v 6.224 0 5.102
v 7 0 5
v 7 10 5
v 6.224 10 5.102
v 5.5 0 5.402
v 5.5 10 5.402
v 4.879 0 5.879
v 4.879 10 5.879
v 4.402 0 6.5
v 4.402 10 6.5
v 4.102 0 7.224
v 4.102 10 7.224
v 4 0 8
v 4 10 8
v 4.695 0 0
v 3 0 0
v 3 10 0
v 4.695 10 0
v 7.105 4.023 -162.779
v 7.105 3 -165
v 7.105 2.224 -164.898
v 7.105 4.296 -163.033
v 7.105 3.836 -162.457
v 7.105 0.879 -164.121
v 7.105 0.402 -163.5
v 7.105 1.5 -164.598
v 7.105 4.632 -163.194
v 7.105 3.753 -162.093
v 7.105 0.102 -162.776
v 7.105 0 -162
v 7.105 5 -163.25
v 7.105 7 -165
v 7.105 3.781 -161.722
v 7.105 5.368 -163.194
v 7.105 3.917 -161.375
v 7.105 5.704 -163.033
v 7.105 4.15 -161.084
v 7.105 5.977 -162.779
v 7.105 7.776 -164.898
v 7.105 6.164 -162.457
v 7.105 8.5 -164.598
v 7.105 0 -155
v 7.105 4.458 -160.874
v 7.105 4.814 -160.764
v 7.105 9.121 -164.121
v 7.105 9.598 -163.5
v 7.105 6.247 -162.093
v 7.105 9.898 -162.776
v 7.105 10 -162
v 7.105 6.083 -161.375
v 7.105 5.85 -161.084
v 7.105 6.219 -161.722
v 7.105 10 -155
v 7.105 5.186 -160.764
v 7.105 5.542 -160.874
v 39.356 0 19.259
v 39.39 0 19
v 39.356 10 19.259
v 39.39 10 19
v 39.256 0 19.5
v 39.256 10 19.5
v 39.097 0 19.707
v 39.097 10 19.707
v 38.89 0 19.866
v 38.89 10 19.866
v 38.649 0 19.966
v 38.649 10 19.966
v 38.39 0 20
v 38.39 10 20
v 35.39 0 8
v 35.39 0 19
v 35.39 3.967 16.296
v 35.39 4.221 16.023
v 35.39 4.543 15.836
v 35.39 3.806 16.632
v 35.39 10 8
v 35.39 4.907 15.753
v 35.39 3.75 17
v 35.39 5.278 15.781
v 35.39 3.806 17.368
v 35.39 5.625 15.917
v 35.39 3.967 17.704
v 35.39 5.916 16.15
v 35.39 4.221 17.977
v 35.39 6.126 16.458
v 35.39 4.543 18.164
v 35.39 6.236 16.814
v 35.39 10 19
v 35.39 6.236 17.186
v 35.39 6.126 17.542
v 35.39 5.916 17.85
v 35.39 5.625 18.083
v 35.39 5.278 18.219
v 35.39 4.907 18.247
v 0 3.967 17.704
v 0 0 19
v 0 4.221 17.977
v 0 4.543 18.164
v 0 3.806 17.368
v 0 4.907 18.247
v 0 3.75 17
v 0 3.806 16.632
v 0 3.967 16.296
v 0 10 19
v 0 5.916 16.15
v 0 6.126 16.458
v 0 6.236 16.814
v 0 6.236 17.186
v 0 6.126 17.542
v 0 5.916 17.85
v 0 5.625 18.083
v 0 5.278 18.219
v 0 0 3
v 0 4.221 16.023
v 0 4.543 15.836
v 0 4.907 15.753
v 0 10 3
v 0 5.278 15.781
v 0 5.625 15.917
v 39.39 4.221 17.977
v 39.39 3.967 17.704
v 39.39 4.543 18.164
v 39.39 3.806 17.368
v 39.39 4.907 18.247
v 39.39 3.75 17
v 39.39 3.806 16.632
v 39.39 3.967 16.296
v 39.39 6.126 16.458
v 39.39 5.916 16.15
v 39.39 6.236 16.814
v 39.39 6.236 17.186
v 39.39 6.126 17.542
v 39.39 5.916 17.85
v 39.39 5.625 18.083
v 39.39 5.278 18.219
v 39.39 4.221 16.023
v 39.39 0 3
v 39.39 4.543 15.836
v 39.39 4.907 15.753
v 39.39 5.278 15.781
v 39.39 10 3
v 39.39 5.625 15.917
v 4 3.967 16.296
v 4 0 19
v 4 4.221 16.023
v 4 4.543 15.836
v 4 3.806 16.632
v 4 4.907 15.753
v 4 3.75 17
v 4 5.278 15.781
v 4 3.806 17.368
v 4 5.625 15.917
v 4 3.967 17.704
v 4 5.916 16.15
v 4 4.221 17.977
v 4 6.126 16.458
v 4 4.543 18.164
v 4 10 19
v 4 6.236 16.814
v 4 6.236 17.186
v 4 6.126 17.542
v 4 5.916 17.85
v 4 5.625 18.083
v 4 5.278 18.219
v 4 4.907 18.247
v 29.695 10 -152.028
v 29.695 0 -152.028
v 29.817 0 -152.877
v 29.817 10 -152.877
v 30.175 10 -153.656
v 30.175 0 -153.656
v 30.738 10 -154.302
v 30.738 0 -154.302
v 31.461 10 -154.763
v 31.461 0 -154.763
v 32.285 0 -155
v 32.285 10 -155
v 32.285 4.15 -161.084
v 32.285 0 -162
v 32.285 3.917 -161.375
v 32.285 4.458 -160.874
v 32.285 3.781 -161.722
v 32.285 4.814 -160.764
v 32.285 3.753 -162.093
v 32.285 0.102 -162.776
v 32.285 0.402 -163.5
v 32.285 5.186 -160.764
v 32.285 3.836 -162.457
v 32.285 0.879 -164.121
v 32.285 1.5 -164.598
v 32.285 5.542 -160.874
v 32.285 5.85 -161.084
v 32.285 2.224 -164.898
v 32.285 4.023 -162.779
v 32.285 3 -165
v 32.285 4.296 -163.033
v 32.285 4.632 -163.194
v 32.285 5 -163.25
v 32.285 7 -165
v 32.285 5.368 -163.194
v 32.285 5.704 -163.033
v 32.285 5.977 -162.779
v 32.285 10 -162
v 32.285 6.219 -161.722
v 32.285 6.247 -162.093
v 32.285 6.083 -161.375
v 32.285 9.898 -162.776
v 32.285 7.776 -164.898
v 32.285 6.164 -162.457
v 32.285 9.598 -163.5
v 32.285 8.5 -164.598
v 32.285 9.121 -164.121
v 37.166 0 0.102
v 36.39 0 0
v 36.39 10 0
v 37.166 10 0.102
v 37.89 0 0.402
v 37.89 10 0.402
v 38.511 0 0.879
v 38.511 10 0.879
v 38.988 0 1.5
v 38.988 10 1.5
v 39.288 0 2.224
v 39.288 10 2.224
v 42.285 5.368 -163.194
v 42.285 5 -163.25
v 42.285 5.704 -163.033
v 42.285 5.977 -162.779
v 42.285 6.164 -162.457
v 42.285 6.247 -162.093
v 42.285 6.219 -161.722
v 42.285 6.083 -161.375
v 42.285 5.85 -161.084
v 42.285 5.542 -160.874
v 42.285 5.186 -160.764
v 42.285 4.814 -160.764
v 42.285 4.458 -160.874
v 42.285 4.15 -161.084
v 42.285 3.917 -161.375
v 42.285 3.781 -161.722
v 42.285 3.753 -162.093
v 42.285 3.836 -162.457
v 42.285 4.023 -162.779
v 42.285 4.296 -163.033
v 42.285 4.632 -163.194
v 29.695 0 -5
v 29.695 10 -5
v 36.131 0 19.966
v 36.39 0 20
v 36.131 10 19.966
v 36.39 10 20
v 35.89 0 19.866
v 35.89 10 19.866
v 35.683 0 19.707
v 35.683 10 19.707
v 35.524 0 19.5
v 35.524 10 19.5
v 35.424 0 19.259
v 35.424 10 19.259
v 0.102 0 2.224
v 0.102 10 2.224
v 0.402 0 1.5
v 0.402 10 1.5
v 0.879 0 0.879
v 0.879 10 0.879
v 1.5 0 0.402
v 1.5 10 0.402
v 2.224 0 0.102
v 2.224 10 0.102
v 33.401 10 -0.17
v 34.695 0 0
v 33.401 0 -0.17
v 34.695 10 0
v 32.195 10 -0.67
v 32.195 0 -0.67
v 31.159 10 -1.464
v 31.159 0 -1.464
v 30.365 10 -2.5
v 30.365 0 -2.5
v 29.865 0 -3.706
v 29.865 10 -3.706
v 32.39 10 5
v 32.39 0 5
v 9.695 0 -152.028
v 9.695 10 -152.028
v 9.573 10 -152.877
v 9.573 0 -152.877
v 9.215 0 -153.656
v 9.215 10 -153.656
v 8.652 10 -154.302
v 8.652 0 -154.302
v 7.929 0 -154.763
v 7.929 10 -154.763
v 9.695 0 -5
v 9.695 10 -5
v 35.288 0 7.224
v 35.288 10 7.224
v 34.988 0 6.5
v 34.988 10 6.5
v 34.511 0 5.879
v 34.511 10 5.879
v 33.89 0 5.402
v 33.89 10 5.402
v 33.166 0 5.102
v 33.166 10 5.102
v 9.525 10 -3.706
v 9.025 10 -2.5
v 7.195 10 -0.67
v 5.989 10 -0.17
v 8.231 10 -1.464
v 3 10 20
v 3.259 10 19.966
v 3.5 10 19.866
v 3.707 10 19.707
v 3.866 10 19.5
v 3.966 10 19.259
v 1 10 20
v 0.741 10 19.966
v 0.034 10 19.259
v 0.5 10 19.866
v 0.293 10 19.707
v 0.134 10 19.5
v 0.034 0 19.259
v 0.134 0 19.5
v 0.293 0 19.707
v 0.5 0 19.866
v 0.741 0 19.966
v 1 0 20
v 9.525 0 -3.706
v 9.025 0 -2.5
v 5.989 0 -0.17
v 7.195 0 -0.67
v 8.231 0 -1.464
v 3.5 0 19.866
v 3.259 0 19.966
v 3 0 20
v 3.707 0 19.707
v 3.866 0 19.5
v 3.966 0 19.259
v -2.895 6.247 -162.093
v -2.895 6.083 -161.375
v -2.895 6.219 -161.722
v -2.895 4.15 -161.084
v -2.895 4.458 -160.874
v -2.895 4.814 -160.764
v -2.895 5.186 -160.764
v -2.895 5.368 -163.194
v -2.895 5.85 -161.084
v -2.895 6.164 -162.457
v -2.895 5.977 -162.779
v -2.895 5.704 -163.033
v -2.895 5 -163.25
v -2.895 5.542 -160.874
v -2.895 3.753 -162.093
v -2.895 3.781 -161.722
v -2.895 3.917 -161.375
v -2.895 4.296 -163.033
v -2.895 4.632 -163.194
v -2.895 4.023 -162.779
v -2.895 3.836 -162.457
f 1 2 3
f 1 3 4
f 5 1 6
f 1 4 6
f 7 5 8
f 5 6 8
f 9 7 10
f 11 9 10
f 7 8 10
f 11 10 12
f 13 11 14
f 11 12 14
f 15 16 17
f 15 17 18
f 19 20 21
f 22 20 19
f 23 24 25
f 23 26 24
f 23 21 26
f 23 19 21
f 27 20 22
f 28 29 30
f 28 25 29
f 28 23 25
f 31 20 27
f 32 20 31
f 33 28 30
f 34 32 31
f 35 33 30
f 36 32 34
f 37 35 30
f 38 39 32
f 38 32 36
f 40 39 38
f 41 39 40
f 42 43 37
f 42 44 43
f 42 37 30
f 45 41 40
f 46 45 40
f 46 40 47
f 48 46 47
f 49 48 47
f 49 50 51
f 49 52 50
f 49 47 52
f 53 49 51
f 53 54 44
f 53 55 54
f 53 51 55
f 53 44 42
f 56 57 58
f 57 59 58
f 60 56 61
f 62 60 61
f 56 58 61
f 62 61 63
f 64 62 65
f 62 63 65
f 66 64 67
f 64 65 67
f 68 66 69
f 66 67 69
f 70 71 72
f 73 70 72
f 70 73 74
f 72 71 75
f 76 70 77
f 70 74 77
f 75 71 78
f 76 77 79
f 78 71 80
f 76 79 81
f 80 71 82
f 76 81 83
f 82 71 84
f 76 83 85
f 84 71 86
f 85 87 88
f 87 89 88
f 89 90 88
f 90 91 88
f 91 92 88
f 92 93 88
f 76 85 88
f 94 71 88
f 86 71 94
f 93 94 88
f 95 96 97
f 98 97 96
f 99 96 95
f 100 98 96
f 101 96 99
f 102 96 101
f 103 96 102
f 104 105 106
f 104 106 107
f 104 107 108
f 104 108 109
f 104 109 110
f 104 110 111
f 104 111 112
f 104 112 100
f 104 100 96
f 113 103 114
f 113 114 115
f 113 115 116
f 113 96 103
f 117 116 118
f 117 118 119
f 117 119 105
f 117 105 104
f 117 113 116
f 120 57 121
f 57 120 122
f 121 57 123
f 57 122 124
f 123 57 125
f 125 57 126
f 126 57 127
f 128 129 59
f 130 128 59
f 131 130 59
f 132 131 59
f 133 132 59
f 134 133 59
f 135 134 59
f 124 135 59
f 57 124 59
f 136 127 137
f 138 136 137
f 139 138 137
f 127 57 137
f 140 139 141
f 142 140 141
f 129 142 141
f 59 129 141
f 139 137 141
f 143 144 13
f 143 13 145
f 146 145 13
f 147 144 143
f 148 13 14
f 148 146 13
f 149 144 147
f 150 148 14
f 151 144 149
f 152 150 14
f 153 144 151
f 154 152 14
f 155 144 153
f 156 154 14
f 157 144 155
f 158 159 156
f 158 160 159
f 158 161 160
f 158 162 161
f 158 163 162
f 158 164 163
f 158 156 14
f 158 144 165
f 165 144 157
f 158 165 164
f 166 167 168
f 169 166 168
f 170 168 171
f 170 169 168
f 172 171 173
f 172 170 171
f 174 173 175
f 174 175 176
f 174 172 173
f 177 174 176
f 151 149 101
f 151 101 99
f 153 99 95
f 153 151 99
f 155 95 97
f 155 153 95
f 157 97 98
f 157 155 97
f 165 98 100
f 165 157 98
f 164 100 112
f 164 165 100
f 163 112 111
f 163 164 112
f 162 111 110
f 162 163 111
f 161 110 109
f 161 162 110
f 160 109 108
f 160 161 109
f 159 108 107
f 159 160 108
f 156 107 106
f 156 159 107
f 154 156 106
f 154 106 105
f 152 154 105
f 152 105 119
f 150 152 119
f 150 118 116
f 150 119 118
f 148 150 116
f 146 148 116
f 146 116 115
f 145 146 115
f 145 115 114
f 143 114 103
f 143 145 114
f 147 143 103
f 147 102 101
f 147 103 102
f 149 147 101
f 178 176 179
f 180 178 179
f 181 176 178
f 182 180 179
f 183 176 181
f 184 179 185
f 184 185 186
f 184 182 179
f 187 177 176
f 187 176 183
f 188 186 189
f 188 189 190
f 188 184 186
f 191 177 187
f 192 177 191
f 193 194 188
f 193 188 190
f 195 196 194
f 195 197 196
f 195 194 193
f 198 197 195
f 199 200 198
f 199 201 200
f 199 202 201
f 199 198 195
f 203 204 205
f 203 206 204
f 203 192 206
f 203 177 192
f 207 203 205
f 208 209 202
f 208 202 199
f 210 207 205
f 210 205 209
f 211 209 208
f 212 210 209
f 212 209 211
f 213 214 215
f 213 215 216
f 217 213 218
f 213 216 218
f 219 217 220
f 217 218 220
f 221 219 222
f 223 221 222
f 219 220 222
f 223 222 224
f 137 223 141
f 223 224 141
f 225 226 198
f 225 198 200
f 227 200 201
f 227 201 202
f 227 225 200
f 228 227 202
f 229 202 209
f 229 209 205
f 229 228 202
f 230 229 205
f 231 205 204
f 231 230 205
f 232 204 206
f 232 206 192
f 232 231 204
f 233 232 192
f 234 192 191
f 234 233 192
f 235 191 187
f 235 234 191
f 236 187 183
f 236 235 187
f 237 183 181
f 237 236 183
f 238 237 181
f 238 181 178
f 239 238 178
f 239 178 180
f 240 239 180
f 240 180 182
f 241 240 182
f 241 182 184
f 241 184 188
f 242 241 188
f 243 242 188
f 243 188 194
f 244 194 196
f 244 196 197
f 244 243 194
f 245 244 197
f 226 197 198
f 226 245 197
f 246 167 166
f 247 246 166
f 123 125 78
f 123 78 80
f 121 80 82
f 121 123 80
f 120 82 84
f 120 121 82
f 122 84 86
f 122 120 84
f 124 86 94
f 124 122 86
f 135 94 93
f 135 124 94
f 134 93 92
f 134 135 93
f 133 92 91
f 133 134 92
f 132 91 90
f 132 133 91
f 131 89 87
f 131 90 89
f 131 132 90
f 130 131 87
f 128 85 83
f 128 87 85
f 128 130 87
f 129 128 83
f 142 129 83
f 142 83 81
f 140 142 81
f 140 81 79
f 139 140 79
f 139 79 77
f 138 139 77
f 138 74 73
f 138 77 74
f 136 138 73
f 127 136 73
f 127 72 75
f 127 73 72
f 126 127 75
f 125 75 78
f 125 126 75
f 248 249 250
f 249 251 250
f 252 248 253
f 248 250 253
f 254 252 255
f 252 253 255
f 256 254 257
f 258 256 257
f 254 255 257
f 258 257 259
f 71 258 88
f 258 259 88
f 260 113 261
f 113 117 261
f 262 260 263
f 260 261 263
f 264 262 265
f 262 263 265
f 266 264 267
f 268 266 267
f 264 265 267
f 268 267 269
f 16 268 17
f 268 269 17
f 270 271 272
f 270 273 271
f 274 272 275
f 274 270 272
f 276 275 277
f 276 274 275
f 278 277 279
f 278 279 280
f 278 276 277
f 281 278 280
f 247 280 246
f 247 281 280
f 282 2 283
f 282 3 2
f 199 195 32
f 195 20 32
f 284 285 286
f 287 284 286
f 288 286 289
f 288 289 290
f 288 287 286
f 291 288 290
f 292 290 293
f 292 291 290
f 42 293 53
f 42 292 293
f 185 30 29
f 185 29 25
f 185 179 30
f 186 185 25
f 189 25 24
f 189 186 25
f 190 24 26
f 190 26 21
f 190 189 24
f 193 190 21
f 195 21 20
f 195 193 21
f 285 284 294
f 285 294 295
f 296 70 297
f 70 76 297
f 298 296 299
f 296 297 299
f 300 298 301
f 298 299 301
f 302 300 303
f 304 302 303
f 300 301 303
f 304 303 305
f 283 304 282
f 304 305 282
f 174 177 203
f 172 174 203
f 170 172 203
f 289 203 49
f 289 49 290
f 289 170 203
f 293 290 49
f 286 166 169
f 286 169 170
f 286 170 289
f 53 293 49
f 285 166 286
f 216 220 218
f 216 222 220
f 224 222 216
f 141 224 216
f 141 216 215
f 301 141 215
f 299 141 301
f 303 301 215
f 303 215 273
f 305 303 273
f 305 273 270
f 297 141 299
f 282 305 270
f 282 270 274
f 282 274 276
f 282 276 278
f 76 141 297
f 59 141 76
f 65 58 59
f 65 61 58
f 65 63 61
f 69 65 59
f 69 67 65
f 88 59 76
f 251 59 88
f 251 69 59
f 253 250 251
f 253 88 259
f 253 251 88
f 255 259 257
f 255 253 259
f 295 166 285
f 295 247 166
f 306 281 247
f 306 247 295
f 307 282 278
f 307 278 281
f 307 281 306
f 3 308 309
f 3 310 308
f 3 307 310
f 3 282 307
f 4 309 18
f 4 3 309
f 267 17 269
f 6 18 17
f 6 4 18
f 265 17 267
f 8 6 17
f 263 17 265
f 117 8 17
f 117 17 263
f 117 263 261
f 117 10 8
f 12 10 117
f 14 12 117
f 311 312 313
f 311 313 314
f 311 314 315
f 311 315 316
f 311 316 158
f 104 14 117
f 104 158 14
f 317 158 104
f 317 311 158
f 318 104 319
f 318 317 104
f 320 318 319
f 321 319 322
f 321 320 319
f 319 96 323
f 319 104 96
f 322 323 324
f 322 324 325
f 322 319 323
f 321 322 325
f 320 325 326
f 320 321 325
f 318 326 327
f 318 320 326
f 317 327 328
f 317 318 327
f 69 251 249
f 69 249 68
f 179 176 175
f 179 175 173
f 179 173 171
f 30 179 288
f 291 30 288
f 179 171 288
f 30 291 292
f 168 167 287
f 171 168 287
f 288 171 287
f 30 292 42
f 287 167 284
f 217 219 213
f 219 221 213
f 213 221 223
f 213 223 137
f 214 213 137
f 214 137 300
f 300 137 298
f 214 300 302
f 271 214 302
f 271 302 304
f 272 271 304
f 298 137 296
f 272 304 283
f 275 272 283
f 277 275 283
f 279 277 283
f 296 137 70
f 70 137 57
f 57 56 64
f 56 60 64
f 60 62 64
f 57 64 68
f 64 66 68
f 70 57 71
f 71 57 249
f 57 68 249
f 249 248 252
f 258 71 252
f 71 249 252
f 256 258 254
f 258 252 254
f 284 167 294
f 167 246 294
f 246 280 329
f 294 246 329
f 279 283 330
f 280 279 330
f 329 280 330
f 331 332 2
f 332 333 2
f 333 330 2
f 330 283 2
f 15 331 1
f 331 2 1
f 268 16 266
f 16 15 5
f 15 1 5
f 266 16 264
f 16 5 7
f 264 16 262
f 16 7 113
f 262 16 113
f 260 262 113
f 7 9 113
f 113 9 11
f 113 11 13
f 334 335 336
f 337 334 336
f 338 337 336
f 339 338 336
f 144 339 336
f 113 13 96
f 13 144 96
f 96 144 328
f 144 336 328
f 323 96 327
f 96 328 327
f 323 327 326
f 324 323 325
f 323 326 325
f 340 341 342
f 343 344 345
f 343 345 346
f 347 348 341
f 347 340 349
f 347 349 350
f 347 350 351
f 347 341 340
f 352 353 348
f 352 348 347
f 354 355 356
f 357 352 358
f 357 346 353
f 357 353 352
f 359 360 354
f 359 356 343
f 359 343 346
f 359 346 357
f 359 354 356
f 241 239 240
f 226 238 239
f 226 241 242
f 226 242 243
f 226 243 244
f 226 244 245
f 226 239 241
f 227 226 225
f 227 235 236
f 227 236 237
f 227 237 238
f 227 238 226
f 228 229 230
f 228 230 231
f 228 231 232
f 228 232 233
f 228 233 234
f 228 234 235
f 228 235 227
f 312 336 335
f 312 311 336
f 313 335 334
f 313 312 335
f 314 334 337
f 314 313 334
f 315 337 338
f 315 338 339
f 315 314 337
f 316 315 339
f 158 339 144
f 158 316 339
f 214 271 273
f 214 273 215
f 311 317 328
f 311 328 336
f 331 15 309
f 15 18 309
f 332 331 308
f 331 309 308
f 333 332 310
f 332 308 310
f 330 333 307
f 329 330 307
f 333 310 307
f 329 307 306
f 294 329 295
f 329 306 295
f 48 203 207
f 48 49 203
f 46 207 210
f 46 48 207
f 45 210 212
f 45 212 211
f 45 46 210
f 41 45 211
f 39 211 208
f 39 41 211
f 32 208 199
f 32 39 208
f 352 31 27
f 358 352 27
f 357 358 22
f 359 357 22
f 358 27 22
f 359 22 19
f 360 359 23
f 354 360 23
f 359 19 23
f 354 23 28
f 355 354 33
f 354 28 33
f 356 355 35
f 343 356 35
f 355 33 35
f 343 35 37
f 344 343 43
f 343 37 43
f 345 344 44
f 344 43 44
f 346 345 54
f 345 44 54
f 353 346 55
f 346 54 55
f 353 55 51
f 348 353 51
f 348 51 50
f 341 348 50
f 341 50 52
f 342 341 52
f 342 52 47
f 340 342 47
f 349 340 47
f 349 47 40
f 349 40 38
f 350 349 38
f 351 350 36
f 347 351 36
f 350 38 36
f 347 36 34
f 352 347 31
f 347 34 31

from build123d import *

# Parameters (mm, degrees)
SKETCH1_W               = 39.39
SKETCH1_H               = 10
BOSS_EXTRUDE1_DEPTH     = 20
SKETCH2_W               = 31.39
SKETCH2_H               = 10
CUT_EXTRUDE1_DEPTH      = 15
CUT_EXTRUDE2_DEPTH      = 46.294283304
CUT_EXTRUDE2_DEPTH_BACK = 46.294283304
SKETCH3_R               = 1.25
FILLET1_R               = 3
FILLET3_R               = 1
SKETCH4_W               = 20
SKETCH4_H               = 10
BOSS_EXTRUDE2_DEPTH     = 165
FILLET4_R               = 5
SKETCH7_W               = 10
SKETCH7_H               = 10
BOSS_EXTRUDE5_DEPTH     = 2.59
SKETCH8_W               = 10
SKETCH8_H               = 10
BOSS_EXTRUDE6_DEPTH     = 2.59
FILLET7_R               = 3
FILLET11_R              = 3
SKETCH9_R               = 1.25
BOSS_EXTRUDE7_DEPTH     = 10
BOSS_EXTRUDE8_START     = 10
SKETCH10_R              = 1.25
BOSS_EXTRUDE8_DEPTH     = 10


with BuildPart() as part:
    # Sketch1 → Boss-Extrude1 (new body)
    with BuildSketch(Plane.XY):
        with Locations((19.695, 5)):
            Rectangle(SKETCH1_W, SKETCH1_H)
    extrude(amount=BOSS_EXTRUDE1_DEPTH)

    # Sketch2 → Cut-Extrude1 (cut)
    with BuildSketch(Plane.XY.offset(20)):
        with Locations((19.695, 5)):
            Rectangle(SKETCH2_W, SKETCH2_H)
    extrude(amount=-CUT_EXTRUDE1_DEPTH, mode=Mode.SUBTRACT)

    # Sketch3 → Cut-Extrude2 (cut, two sides: drawn at the far end of the back side and taken through both)
    with BuildSketch(Plane.ZY.offset(-CUT_EXTRUDE2_DEPTH_BACK)):
        with Locations(Location((17, 5, 0), (0, 0, 270))):
            Circle(SKETCH3_R)
    extrude(amount=CUT_EXTRUDE2_DEPTH + CUT_EXTRUDE2_DEPTH_BACK, mode=Mode.SUBTRACT)

    # Fillet1
    fillet1_edges = [part.edges().sort_by_distance(p)[0] for p in [
        (4, 5, 5),
        (35.39, 5, 5),
        (39.39, 5, 0),
        (0, 5, 0),
    ]]
    fillet(fillet1_edges, radius=FILLET1_R)

    # Fillet3
    fillet3_edges = [part.edges().sort_by_distance(p)[0] for p in [
        (39.39, 5, 20),
        (4, 5, 20),
        (35.39, 5, 20),
        (0, 5, 20),
    ]]
    fillet(fillet3_edges, radius=FILLET3_R)

    # Sketch4 → Boss-Extrude2 (add)
    with BuildSketch(Plane(origin=(0, 0, 0), x_dir=(-1, 0, 0), z_dir=(0, 0, -1))):
        with Locations((-19.695, 5)):
            Rectangle(SKETCH4_W, SKETCH4_H)
    extrude(amount=BOSS_EXTRUDE2_DEPTH)

    # Fillet4
    fillet4_edges = [part.edges().sort_by_distance(p)[0] for p in [
        (29.695, 5, 0),
        (9.695, 5, 0),
    ]]
    fillet(fillet4_edges, radius=FILLET4_R)

    # Sketch7 → Boss-Extrude5 (add)
    with BuildSketch(Plane.ZY.offset(-9.695)):
        with Locations((-160, 5)):
            Rectangle(SKETCH7_W, SKETCH7_H)
    extrude(amount=BOSS_EXTRUDE5_DEPTH)

    # Sketch8 → Boss-Extrude6 (add)
    with BuildSketch(Plane(origin=(29.695, 0, 0), x_dir=(0, 0, -1), z_dir=(1, 0, 0))):
        with Locations((160, 5)):
            Rectangle(SKETCH8_W, SKETCH8_H)
    extrude(amount=BOSS_EXTRUDE6_DEPTH)

    # Fillet7
    # the kernel refuses this fillet: 3 mm, written as the material it adds along each edge
    with BuildSketch(Plane(origin=(9.695, 0, -155), x_dir=(0, 0, 1), z_dir=(0, 1, 0))) as fillet7_piece_1:
        with BuildLine():
            CenterArc((2.971851275, -3), FILLET7_R, 90, 82.144993797)
            Line((0, -2.59), (-0.059437025, -2.5818))
            ThreePointArc((-0.059437025, -2.5818), (-0.06, -1.295), (-0.06, 0))
            Line((-0.06, 0), (0, 0.06))
            Line((0, 0.06), (2.971851275, 0.06))
            Line((2.971851275, 0.06), (2.971851275, 0))
        make_face()
    extrude(amount=10)
    with BuildSketch(Plane(origin=(29.695, 10, -155), x_dir=(1, 0, 0), z_dir=(0, -1, 0))) as fillet7_piece_2:
        with BuildLine():
            CenterArc((3, 2.971851275), FILLET7_R, 180, 82.144993797)
            Line((0, 2.971851275), (-0.06, 2.971851275))
            Line((-0.06, 2.971851275), (-0.06, 0))
            Line((-0.06, 0), (0, -0.06))
            ThreePointArc((0, -0.06), (1.295, -0.06), (2.5818, -0.059437025))
            Line((2.5818, -0.059437025), (2.59, 0))
        make_face()
    extrude(amount=10)

    # Fillet11
    fillet11_edges = [part.edges().sort_by_distance(p)[0] for p in [
        (19.695, 0, -165),
        (19.695, 10, -165),
    ]]
    fillet(fillet11_edges, radius=FILLET11_R)

    # Sketch9 → Boss-Extrude7 (add)
    with BuildSketch(Plane.ZY.offset(-7.105)):
        with Locations(Location((-162, 5, 0), (0, 0, 180))):
            Circle(SKETCH9_R)
    extrude(amount=BOSS_EXTRUDE7_DEPTH)

    # Sketch10 → Boss-Extrude8 (add)
    with BuildSketch(Plane(origin=(32.285, 0, 0), x_dir=(0, 0, -1), z_dir=(1, 0, 0)).offset(BOSS_EXTRUDE8_START)):
        with Locations((162, 5)):
            Circle(SKETCH10_R)
    extrude(amount=-BOSS_EXTRUDE8_DEPTH)


solid = part.part
